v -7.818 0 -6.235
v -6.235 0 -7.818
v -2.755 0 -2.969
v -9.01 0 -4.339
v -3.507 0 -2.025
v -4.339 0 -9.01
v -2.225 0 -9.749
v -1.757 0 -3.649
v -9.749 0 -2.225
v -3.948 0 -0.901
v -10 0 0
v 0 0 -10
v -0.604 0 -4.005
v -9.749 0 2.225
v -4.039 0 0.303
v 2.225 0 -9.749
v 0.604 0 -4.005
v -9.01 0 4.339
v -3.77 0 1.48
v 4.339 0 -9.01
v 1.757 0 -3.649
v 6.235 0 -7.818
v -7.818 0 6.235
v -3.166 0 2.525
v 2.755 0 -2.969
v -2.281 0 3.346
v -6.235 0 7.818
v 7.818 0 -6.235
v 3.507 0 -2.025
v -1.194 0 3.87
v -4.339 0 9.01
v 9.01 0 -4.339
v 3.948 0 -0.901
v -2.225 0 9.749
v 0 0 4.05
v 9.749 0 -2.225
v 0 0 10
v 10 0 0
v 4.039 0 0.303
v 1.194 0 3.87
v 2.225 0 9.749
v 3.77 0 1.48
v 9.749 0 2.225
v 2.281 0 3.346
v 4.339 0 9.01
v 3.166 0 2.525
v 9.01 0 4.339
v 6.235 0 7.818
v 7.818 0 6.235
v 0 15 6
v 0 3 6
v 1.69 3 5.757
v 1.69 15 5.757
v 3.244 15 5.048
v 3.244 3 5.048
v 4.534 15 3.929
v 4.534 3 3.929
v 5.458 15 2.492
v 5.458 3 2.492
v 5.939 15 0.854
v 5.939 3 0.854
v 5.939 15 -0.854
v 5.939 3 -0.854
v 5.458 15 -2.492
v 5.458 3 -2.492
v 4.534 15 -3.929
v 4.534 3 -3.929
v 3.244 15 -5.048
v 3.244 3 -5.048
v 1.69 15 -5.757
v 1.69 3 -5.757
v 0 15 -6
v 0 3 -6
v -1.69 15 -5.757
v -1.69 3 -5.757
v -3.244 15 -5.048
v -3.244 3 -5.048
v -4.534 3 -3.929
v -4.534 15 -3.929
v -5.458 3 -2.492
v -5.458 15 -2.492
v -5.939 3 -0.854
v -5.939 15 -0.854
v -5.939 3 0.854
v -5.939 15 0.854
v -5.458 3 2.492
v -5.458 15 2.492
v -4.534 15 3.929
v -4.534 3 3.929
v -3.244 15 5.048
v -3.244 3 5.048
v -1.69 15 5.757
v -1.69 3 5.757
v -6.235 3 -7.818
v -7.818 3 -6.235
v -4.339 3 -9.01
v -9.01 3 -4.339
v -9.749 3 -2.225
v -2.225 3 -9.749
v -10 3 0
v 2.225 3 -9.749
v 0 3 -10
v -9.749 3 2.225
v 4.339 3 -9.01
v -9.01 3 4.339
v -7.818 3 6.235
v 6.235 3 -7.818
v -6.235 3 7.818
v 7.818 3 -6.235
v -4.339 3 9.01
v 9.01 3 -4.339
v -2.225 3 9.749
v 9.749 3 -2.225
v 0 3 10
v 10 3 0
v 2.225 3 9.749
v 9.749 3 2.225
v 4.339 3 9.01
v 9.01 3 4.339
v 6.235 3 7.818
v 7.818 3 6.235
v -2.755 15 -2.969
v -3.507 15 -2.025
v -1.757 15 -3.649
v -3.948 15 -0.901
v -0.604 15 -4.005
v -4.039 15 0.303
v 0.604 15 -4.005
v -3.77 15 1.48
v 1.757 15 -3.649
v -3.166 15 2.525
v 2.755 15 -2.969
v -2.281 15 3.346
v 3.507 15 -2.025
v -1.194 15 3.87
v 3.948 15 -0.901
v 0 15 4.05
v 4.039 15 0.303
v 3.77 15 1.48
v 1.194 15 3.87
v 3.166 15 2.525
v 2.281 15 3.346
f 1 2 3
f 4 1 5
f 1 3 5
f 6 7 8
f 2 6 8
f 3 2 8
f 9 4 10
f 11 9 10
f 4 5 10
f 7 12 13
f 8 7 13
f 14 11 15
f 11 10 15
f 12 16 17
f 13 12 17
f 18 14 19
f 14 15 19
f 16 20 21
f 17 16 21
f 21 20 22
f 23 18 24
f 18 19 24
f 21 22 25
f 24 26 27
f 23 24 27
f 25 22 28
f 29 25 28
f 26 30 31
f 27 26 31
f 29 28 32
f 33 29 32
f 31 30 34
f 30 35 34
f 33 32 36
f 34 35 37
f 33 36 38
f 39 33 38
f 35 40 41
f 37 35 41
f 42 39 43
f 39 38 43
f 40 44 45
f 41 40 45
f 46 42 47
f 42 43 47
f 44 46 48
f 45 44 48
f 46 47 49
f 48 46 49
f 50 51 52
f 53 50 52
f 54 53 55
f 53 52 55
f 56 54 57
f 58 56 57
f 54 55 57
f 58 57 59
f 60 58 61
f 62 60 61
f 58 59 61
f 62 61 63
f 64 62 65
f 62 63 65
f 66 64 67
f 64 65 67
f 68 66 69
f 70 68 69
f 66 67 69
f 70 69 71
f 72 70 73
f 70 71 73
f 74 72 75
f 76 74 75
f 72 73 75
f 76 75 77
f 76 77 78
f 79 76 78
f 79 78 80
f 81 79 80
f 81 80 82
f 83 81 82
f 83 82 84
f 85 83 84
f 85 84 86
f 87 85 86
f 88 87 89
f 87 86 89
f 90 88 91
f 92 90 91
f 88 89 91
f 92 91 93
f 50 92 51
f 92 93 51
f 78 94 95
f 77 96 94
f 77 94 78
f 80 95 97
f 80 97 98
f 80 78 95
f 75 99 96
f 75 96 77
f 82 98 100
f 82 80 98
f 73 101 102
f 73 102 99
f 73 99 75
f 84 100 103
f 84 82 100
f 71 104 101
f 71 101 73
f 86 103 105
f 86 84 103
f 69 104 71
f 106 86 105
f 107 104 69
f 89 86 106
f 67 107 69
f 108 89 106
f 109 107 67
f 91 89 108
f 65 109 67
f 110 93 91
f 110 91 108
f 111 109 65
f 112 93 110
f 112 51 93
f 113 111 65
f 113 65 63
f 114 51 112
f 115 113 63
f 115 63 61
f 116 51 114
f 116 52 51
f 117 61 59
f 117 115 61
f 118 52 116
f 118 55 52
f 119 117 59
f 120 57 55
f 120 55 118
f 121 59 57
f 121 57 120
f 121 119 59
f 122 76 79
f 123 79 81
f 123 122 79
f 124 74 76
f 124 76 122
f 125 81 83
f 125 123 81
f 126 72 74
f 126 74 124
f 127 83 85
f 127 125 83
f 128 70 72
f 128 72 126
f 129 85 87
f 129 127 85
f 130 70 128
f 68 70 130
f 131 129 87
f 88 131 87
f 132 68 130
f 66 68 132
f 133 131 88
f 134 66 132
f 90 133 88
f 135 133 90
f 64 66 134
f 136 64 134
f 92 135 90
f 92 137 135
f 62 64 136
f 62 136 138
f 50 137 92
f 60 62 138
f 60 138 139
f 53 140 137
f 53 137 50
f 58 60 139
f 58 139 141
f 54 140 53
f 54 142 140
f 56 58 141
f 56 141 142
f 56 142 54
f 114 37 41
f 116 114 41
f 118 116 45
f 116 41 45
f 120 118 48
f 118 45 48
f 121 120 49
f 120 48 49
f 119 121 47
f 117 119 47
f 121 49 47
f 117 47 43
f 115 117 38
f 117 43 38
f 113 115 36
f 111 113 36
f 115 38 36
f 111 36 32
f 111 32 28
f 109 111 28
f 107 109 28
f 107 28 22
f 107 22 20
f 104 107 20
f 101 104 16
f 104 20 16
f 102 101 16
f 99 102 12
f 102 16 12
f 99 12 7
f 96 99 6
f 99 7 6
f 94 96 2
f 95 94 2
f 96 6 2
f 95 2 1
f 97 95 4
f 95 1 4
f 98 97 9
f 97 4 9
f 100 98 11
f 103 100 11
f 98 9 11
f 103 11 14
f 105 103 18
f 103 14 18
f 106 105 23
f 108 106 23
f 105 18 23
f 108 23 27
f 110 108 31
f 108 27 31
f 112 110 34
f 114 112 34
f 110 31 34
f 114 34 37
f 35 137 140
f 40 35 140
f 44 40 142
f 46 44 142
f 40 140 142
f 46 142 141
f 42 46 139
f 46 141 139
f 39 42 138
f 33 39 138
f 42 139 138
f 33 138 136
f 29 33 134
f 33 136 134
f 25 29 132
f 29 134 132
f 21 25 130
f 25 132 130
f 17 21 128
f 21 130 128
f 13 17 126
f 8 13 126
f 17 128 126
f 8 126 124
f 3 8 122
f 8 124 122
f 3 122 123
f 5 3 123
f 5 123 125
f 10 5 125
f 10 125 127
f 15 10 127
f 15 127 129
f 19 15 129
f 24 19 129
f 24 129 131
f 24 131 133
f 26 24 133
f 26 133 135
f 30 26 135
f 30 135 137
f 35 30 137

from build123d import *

# Parameters (mm, degrees)
ESBO_O1_R                = 10
RESSALTO_EXTRUS_O1_DEPTH = 3
ESBO_O2_R                = 6
RESSALTO_EXTRUS_O2_DEPTH = 12
ESBO_O3_R                = 4.05
CORTE_EXTRUS_O1_DEPTH    = 21.615528128


with BuildPart() as part:
    # Esboço1 → Ressalto-extrusão1 (new body)
    with BuildSketch(Plane(origin=(0, 0, 0), x_dir=(1, 0, 0), z_dir=(0, 1, 0))):
        with Locations(Location((0, 0, 0), (0, 0, 270))):
            Circle(ESBO_O1_R)
    extrude(amount=RESSALTO_EXTRUS_O1_DEPTH)

    # Esboço2 → Ressalto-extrusão2 (add)
    with BuildSketch(Plane(origin=(0, 3, 0), x_dir=(1, 0, 0), z_dir=(0, 1, 0))):
        with Locations(Location((0, 0, 0), (0, 0, 270))):
            Circle(ESBO_O2_R)
    extrude(amount=RESSALTO_EXTRUS_O2_DEPTH)

    # Esboço3 → Corte-extrusão1 (cut, through all)
    with BuildSketch(Plane(origin=(0, 15, 0), x_dir=(1, 0, 0), z_dir=(0, 1, 0))):
        with Locations(Location((0, 0, 0), (0, 0, 270))):
            Circle(ESBO_O3_R)
    extrude(amount=-CORTE_EXTRUS_O1_DEPTH, mode=Mode.SUBTRACT)


solid = part.part
